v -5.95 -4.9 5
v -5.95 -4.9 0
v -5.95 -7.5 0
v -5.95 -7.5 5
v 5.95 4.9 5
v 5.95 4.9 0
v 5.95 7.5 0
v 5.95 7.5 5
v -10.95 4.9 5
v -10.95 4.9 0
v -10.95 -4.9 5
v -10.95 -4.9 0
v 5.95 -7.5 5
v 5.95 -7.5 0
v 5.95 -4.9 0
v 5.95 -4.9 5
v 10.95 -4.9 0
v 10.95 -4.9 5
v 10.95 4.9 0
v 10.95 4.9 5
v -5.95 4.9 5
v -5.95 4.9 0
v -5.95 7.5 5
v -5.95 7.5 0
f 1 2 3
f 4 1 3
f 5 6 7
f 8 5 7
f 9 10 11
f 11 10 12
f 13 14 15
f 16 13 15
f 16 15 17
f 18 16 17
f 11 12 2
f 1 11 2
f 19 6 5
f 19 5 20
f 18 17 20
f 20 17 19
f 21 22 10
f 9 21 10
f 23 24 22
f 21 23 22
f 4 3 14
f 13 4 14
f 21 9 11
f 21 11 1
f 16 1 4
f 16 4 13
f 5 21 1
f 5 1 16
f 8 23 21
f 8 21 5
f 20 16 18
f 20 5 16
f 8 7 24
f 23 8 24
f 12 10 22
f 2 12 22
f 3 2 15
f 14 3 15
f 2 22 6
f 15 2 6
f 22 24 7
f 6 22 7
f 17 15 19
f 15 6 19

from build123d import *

# Parameters (mm, degrees)
F0_W     = 5
F0_H     = 9.8
F1_DEPTH = 5


with BuildPart() as f1:
    # F0 (on Top) → F1 (new body)
    with BuildSketch(Plane.XY):
        Polygon((-5.95, -4.9), (-5.95, 4.9), (-10.95, 4.9), (-10.95, 0), (-10.95, -4.9), align=None)
        Polygon((5.95, 4.9), (5.95, 7.5), (-5.95, 7.5), (-5.95, 4.9), (-5.95, -4.9), (-5.95, -7.5), (5.95, -7.5), (5.95, -4.9), align=None)
        with Locations((8.45, 0)):
            Rectangle(F0_W, F0_H)
    extrude(amount=F1_DEPTH)


solid = f1.part
